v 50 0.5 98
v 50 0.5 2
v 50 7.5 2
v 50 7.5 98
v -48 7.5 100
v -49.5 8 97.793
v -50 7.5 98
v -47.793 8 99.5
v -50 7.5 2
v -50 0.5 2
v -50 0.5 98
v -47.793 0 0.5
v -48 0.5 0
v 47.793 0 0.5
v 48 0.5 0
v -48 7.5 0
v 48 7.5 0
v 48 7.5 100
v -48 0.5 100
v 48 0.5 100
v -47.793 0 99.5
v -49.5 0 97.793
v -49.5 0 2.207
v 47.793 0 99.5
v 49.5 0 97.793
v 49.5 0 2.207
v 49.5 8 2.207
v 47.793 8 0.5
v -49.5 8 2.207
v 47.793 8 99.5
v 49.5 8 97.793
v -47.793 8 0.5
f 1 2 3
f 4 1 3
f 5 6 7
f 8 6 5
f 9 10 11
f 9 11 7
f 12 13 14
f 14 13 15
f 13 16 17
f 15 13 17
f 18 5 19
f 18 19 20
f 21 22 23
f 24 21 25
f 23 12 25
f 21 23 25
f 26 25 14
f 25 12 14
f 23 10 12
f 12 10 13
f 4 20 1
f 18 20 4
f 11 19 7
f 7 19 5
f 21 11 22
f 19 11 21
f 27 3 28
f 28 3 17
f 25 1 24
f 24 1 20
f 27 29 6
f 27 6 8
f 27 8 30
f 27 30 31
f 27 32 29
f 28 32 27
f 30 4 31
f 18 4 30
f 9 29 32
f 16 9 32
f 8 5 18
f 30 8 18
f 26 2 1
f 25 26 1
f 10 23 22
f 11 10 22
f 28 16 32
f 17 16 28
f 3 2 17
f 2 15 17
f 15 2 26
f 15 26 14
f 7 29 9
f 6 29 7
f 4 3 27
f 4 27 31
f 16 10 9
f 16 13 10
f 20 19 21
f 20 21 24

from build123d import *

# Parameters (mm, degrees)
SKETCH1_W           = 100
SKETCH1_H           = 8
BOSS_EXTRUDE1_DEPTH = 100
CHAMFER1_SIZE       = 2
CHAMFER2_SIZE       = 0.5


with BuildPart() as part:
    # Sketch1 → Boss-Extrude1 (new body)
    with BuildSketch(Plane.XY):
        with Locations((0, 4)):
            Rectangle(SKETCH1_W, SKETCH1_H)
    extrude(amount=BOSS_EXTRUDE1_DEPTH)

    # Chamfer1
    chamfer1_edges = [part.edges().sort_by_distance(p)[0] for p in [
        (-50, 4, 100),
        (50, 4, 100),
        (-50, 4, 0),
        (50, 4, 0),
    ]]
    chamfer(chamfer1_edges, length=CHAMFER1_SIZE)

    # Chamfer2
    chamfer2_edges = [part.edges().sort_by_distance(p)[0] for p in [
        (-50, 0, 50),
        (-50, 8, 50),
        (0, 0, 0),
        (50, 0, 50),
        (0, 0, 100),
        (49, 0, 99),
        (-49, 0, 99),
        (49, 0, 1),
        (-49, 0, 1),
        (0, 8, 0),
        (0, 8, 100),
        (50, 8, 50),
        (49, 8, 99),
        (-49, 8, 99),
        (49, 8, 1),
        (-49, 8, 1),
    ]]
    chamfer(chamfer2_edges, length=CHAMFER2_SIZE)


solid = part.part
